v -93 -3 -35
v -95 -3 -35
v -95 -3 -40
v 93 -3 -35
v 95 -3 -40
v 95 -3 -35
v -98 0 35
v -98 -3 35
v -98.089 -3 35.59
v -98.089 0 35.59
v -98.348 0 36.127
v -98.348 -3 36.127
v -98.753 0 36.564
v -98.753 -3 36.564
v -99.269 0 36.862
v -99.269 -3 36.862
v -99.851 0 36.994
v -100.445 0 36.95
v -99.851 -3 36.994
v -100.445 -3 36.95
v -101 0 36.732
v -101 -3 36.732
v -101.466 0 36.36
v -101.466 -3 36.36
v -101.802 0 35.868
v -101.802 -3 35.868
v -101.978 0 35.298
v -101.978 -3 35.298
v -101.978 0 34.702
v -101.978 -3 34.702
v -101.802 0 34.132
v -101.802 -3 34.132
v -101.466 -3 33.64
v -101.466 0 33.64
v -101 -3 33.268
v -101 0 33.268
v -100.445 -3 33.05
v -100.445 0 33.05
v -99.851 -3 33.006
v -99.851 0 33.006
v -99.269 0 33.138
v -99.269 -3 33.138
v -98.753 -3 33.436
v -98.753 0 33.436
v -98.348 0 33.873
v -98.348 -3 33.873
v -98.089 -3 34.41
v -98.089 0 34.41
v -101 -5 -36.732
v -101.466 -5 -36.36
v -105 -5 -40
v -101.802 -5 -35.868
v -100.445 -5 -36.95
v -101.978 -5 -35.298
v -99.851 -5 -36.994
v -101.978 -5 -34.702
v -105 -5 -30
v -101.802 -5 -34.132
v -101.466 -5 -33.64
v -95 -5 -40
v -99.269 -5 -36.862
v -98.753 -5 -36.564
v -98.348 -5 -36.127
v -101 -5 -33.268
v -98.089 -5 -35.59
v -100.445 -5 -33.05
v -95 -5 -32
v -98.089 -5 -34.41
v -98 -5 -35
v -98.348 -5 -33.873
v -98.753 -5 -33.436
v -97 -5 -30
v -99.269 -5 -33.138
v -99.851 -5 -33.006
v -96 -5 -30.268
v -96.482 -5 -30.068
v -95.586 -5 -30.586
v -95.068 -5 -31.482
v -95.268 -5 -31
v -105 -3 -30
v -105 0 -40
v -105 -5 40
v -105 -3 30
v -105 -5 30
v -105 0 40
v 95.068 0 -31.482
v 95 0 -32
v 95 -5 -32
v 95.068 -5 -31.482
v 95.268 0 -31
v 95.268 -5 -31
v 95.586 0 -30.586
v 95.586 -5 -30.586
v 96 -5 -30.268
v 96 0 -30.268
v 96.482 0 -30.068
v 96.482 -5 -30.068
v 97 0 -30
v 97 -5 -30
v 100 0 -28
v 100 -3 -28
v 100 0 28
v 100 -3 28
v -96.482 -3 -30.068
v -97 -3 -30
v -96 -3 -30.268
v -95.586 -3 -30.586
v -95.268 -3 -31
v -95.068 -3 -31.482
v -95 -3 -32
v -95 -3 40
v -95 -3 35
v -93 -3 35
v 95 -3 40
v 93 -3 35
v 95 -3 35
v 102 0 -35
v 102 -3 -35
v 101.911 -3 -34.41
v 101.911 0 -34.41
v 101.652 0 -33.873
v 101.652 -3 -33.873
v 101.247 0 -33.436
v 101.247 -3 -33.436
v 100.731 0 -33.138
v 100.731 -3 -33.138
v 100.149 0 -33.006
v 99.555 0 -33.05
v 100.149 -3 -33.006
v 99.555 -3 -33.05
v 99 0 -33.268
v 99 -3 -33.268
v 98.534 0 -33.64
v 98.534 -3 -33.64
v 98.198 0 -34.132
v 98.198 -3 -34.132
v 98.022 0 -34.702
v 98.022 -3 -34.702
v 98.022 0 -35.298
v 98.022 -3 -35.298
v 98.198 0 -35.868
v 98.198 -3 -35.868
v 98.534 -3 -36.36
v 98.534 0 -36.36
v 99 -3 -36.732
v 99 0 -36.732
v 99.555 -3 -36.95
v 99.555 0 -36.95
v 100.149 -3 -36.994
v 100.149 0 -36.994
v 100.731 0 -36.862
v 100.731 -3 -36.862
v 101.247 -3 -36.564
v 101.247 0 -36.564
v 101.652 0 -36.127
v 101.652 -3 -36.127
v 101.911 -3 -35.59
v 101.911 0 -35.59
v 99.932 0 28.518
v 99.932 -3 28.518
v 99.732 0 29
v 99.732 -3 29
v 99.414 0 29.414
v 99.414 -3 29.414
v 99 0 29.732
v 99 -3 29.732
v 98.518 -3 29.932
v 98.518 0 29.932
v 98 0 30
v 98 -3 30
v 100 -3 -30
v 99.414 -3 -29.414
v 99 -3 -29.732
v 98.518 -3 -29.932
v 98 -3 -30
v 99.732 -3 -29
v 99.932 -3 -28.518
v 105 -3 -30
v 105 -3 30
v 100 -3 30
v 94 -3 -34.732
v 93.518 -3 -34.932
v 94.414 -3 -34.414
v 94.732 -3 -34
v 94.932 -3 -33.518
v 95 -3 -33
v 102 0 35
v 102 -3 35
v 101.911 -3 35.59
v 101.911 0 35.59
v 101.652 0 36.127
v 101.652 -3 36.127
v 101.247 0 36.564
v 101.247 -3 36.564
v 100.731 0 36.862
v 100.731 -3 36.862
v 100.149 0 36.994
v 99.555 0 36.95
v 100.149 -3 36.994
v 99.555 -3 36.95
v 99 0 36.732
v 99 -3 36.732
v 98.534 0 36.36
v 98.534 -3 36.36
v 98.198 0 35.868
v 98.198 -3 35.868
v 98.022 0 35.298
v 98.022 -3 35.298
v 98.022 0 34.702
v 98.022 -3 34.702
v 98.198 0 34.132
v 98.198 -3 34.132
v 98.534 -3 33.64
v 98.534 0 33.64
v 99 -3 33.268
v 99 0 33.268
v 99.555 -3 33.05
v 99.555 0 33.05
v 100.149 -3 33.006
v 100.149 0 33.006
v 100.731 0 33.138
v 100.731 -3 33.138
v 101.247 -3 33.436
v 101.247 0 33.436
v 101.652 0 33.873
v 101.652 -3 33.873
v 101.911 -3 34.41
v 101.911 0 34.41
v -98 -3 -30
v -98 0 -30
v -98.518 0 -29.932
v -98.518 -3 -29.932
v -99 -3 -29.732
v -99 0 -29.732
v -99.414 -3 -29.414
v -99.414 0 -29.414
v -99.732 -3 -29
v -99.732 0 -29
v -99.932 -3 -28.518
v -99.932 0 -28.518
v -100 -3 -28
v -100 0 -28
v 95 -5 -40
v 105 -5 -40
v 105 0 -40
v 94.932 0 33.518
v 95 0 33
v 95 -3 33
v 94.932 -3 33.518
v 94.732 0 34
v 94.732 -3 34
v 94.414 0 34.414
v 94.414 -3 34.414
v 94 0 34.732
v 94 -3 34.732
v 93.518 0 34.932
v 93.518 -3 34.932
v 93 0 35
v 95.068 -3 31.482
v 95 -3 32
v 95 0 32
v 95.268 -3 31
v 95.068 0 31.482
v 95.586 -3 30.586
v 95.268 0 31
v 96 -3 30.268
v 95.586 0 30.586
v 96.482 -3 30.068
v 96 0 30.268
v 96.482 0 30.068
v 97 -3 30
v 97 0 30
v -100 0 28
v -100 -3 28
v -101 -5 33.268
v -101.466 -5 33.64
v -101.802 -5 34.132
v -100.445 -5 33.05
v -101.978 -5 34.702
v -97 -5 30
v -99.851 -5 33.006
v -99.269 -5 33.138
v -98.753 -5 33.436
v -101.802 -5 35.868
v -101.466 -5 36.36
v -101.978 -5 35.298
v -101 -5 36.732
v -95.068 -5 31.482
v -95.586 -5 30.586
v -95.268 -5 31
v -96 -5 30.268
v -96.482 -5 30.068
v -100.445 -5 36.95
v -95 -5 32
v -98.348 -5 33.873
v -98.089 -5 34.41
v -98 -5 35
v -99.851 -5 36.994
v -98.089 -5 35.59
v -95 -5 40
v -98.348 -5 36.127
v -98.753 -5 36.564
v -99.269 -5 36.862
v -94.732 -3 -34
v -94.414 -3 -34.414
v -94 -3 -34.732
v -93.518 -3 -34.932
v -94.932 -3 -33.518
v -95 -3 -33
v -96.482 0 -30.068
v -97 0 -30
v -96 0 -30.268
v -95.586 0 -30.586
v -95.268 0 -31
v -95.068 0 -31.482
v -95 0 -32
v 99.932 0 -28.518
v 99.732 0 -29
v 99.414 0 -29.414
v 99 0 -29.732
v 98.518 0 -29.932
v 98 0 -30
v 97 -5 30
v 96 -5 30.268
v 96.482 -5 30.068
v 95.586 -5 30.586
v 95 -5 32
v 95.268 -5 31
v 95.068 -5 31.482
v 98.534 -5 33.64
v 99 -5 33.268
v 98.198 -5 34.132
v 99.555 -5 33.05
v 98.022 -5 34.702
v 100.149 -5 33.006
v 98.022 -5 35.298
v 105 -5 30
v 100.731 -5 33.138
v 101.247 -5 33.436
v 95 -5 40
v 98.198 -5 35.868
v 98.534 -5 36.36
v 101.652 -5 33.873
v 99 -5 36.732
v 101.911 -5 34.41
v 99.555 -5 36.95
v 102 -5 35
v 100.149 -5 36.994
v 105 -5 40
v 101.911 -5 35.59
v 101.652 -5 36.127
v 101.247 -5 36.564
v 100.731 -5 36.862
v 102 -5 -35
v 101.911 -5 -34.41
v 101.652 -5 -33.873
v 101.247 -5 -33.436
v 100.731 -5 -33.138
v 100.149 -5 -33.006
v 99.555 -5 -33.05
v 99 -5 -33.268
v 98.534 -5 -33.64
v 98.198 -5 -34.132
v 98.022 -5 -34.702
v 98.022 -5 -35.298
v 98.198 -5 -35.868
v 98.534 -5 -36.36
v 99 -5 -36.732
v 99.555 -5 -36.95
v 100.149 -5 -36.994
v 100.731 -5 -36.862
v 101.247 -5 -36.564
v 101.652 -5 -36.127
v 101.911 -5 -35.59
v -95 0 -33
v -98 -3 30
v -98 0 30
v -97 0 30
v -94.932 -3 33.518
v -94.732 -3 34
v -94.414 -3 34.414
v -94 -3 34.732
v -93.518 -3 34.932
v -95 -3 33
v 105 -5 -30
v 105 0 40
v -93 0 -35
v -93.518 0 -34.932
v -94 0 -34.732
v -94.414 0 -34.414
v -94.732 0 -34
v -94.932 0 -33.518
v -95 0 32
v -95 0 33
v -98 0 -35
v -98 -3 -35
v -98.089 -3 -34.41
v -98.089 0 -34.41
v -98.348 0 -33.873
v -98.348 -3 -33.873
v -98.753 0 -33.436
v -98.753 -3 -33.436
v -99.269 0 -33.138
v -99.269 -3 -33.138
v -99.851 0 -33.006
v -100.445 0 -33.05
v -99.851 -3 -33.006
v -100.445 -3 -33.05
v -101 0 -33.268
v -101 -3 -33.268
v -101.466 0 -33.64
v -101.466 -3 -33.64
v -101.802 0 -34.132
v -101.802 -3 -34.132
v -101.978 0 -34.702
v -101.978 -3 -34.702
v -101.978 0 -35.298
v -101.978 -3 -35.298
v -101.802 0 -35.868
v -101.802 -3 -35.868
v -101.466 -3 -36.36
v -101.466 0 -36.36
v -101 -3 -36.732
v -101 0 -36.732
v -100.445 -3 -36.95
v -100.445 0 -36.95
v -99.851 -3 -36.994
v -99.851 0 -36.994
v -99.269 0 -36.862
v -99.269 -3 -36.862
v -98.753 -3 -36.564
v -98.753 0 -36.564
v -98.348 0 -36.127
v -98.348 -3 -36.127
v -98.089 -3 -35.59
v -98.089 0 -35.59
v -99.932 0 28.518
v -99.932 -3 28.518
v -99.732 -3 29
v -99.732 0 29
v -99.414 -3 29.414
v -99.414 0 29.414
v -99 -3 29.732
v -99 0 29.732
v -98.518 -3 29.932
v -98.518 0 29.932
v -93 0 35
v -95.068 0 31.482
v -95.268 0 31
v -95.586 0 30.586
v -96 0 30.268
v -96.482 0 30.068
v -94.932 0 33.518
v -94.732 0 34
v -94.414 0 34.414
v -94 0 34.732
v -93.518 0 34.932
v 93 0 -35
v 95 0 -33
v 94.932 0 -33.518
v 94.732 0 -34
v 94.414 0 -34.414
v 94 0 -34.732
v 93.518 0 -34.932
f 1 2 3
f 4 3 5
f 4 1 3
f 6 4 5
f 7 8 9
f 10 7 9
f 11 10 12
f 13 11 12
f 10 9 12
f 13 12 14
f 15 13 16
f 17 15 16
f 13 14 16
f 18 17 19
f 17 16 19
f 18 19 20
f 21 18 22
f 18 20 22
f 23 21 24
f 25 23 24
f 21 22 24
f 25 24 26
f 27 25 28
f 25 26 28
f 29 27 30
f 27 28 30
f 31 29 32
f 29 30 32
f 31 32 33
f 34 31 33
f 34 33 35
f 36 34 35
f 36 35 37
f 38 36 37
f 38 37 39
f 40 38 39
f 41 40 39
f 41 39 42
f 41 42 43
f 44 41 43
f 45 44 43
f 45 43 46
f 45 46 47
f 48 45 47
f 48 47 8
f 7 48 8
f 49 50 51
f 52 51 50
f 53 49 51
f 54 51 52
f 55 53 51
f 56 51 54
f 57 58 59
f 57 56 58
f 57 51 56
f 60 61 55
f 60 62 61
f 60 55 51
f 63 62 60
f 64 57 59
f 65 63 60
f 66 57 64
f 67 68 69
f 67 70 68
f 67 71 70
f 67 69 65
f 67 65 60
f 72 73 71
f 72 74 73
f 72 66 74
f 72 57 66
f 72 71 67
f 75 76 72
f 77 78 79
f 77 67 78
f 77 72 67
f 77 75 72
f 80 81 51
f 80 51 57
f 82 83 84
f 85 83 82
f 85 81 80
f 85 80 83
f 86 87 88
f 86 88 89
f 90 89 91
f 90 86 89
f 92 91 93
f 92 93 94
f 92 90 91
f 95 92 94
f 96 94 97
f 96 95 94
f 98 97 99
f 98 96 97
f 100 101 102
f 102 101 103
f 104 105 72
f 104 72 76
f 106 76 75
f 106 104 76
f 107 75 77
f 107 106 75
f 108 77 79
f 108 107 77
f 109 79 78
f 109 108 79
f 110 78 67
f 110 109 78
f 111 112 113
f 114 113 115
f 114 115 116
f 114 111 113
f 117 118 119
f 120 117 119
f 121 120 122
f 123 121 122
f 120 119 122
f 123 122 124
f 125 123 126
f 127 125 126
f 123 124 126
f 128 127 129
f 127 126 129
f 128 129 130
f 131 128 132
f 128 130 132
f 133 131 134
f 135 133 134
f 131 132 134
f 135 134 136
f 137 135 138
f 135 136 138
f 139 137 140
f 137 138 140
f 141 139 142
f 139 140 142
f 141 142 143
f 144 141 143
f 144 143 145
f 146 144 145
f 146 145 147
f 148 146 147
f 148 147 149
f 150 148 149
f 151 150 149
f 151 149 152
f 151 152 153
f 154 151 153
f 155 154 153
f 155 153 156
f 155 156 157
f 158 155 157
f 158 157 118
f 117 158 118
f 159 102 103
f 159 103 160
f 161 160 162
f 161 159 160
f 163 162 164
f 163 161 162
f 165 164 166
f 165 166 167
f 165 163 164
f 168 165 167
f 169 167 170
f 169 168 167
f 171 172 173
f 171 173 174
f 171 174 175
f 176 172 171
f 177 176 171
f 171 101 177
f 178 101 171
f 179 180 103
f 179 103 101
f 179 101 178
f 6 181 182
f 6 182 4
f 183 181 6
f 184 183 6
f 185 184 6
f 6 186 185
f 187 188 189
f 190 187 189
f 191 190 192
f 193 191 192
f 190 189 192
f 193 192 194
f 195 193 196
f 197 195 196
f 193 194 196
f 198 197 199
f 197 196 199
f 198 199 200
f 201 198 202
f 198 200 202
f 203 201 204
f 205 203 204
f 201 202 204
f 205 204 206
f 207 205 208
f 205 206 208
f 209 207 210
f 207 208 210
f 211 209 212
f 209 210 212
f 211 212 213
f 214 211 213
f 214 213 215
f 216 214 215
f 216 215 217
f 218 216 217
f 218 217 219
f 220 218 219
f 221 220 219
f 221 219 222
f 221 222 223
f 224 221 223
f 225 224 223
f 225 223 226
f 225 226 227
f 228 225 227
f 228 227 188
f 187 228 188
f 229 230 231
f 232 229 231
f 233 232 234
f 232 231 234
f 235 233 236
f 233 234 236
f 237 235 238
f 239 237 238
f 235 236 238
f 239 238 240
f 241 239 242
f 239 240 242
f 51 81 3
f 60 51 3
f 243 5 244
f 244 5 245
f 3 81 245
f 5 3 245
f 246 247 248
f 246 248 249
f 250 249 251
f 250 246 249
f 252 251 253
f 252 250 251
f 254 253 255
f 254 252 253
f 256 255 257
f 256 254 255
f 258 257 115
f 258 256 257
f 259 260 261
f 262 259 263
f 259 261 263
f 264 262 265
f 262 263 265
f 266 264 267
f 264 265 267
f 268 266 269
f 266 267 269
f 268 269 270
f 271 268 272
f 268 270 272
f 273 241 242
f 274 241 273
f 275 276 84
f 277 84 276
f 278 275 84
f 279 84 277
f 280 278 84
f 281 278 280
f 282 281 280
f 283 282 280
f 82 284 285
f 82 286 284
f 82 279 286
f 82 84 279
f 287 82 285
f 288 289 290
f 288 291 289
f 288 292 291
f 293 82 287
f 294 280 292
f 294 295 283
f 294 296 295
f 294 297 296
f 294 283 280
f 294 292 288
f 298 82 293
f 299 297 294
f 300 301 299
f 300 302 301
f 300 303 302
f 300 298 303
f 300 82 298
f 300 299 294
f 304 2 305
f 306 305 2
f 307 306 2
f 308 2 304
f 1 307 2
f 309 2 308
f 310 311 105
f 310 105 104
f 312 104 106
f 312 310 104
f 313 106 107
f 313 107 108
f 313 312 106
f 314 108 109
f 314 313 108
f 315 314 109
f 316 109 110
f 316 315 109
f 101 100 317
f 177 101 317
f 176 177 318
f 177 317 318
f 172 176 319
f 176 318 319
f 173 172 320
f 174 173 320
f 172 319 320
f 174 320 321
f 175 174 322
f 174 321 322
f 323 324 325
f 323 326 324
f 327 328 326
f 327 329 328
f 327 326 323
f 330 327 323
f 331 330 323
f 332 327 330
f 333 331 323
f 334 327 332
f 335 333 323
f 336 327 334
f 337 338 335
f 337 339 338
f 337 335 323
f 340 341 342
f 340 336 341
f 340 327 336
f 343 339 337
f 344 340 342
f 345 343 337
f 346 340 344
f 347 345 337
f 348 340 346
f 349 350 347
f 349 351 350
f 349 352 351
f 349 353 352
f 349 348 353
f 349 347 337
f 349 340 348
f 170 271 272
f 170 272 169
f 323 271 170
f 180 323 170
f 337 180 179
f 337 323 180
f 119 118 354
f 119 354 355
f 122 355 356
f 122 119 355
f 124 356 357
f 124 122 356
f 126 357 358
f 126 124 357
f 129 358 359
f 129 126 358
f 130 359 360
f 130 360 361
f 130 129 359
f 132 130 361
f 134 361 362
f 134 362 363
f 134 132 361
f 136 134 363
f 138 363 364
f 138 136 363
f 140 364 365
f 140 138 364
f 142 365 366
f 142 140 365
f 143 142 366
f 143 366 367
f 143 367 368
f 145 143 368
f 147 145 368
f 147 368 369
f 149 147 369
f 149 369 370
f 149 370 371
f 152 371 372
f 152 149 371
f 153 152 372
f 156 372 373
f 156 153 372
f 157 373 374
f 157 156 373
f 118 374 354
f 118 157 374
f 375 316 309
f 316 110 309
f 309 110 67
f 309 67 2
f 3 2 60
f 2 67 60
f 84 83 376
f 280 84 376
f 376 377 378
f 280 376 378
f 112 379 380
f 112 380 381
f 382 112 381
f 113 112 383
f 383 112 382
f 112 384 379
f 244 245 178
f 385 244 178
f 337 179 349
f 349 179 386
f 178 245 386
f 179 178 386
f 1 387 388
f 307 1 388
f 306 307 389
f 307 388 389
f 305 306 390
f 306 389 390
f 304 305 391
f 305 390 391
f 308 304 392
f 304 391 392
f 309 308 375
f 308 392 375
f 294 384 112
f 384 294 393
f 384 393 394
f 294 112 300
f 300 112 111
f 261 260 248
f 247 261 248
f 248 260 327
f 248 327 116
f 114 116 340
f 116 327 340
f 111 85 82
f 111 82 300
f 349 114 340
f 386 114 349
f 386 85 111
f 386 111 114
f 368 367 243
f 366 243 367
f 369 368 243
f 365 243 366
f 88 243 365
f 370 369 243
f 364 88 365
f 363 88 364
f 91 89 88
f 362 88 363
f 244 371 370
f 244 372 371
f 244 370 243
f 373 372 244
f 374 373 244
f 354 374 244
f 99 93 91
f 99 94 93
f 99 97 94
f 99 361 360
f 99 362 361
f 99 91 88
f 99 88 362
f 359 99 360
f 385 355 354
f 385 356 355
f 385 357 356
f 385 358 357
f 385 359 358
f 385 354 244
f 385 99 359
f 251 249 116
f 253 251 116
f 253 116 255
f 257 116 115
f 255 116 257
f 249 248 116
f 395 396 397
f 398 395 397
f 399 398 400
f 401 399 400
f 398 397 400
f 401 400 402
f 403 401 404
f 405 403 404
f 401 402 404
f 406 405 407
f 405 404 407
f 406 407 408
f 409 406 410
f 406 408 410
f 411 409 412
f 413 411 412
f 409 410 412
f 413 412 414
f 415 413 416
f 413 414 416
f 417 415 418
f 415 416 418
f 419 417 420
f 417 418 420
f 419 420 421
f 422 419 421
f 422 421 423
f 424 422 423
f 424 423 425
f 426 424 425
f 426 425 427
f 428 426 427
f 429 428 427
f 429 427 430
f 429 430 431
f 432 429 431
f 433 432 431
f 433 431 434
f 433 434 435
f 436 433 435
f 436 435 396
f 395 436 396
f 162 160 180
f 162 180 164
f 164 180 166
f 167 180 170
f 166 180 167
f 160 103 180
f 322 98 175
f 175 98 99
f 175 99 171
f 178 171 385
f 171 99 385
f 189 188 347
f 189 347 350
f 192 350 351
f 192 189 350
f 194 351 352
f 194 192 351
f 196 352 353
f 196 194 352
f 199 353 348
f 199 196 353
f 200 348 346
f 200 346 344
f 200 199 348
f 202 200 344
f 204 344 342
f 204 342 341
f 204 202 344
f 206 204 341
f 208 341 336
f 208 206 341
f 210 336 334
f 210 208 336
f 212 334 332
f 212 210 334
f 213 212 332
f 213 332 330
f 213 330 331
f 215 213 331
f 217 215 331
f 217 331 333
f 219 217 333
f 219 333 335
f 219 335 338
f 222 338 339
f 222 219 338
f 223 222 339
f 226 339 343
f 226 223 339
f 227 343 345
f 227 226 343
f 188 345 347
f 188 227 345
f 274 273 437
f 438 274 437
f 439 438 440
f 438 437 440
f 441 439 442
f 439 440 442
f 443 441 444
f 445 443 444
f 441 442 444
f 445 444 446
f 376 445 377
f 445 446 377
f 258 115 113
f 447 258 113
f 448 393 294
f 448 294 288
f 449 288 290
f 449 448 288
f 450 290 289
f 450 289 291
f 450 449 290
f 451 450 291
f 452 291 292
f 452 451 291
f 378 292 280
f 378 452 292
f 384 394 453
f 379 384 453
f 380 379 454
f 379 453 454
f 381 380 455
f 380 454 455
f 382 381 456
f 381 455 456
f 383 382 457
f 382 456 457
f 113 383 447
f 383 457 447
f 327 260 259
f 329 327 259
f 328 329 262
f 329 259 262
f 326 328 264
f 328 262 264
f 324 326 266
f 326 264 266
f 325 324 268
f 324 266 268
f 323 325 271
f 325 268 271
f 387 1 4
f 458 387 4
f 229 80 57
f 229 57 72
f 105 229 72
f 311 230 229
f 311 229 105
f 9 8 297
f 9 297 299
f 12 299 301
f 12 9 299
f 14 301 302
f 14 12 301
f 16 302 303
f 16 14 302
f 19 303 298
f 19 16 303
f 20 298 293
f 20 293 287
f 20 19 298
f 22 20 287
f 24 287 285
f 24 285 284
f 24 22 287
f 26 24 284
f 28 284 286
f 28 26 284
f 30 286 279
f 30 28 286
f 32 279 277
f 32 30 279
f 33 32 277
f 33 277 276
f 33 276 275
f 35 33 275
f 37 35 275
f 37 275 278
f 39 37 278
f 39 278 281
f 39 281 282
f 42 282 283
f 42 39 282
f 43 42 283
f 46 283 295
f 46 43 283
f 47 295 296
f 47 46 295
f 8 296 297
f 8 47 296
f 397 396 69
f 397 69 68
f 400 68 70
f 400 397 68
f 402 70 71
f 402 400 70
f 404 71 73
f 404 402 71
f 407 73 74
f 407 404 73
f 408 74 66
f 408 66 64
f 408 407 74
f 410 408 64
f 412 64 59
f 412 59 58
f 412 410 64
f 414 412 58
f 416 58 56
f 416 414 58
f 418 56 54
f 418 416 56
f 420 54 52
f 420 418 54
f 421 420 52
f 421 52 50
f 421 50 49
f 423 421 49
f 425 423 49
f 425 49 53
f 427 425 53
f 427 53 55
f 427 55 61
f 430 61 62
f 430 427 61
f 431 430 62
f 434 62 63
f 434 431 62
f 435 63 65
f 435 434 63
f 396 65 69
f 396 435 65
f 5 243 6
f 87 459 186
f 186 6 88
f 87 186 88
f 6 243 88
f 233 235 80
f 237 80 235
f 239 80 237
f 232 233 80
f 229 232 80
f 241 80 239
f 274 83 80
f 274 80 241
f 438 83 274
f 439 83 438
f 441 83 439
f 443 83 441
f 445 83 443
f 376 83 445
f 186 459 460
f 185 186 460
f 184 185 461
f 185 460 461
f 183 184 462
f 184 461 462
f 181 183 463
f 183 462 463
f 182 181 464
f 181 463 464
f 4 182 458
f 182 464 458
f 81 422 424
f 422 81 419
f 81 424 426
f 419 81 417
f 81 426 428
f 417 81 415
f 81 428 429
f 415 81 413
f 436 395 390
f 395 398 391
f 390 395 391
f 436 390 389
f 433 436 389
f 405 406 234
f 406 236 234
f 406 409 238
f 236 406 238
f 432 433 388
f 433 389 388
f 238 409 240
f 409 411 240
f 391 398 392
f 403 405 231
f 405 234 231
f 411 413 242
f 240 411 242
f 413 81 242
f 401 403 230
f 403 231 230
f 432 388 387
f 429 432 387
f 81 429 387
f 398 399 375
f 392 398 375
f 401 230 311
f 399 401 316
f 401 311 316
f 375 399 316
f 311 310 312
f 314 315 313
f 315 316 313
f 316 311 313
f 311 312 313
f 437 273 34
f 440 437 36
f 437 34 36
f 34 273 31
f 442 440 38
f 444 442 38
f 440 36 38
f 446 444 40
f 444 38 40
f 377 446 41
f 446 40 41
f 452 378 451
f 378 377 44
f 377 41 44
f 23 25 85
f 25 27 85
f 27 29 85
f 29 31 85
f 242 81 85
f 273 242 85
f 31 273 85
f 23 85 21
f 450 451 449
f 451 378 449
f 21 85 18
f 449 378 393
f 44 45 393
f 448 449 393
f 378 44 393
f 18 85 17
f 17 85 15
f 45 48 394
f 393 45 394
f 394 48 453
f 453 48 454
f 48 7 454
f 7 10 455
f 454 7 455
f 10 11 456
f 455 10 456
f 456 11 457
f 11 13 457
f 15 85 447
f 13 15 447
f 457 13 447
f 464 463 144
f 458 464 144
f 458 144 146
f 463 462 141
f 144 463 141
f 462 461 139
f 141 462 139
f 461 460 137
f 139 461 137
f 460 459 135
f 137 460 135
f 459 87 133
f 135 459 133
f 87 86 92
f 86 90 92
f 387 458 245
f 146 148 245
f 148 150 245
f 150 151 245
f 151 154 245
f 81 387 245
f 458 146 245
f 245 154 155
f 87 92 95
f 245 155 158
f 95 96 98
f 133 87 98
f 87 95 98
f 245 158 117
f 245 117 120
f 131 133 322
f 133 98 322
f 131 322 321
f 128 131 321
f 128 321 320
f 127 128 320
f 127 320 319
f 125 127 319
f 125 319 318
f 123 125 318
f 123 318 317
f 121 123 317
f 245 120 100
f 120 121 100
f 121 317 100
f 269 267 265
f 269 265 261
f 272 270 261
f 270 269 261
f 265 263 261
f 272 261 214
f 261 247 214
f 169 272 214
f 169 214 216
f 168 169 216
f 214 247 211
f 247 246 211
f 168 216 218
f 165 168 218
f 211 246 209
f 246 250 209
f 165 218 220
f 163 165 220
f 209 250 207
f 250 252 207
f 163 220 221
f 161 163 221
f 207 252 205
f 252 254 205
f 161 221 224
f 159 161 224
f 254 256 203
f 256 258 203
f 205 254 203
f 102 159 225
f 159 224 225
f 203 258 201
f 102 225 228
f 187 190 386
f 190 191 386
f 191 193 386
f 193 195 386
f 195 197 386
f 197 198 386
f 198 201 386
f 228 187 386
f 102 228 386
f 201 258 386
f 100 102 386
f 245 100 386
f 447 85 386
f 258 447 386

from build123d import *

# Parameters (mm, degrees)
F0_W        = 210
F0_H        = 80
F1_DEPTH    = 3
F2_R        = 2
F3_DEPTH    = 25
F4_W        = 10
F4_H        = 10
F4_R        = 2
F5_DEPTH    = 2
F6_W        = 5
F6_H        = 60
F7_DEPTH    = 25
F8_T1_DEPTH = 3
F8_T3_DEPTH = 7
F8_T5_DEPTH = 8
F8_T7_DEPTH = 15


# Not quite as in the source:
# - a fillet or chamfer that OpenCascade refuses, or shapes differently, is made with other operations: its cross-section is extruded or revolved along the edge and cut away or added


with BuildPart() as f1:
    # F0 (on Front) → F1 (new body)
    with BuildSketch(Plane.XZ):
        Rectangle(F0_W, F0_H)
    extrude(amount=F1_DEPTH)

    # F2 (on face) → F3 (cut)
    with BuildSketch(Plane.XZ.offset(3)):
        with Locations((-100.000000149, 35.000000149)):
            Circle(F2_R)
        with Locations((-100.000000149, -35.000000149)):
            Circle(F2_R)
        with Locations((100.000000149, -35.000000149)):
            Circle(F2_R)
        with Locations((100.000000149, 35.000000149)):
            Circle(F2_R)
    extrude(amount=-F3_DEPTH, mode=Mode.SUBTRACT)

    # F4 (on face) → F5 (join)
    with BuildSketch(Plane.XZ.offset(3)):
        with Locations((-100, 35)):
            Rectangle(F4_W, F4_H)
        with Locations((-100.000000149, 35.000000149)):
            Circle(F4_R, mode=Mode.SUBTRACT)
        with Locations((-100, -35)):
            Rectangle(F4_W, F4_H)
        with Locations((-100.000000149, -35.000000149)):
            Circle(F4_R, mode=Mode.SUBTRACT)
        with Locations((100, -35)):
            Rectangle(F4_W, F4_H)
        with Locations((100.000000149, -35.000000149)):
            Circle(F4_R, mode=Mode.SUBTRACT)
        with Locations((100, 35)):
            Rectangle(F4_W, F4_H)
        with Locations((100.000000149, 35.000000149)):
            Circle(F4_R, mode=Mode.SUBTRACT)
    extrude(amount=F5_DEPTH)

    # F6 (on face) → F7 (cut)
    with BuildSketch(Plane.XZ.offset(3)):
        Polygon((95, 35), (-95, 35), (-95, 30), (-95, -30), (-95, -35), (95, -35), (95, -30), (95, 30), align=None)
        with Locations((-97.5, 0)):
            Rectangle(F6_W, F6_H)
        with Locations((97.5, 0)):
            Rectangle(F6_W, F6_H)
    extrude(amount=-F7_DEPTH, mode=Mode.SUBTRACT)

    # F8: fillet of radius 2 on 15 edges, made by hand

    # F8_s2 → F8_t1 (join)
    with BuildSketch(Plane.XZ):
        with BuildLine():
            ThreePointArc((-100, 28), (-99.4142135624, 29.4142135624), (-98, 30))
            Line((-98, 30), (-100, 30))
            Line((-100, 30), (-100, 28))
        make_face()
        with BuildLine():
            ThreePointArc((-95, 33), (-94.4142135624, 34.4142135624), (-93, 35))
            Line((-93, 35), (-95, 35))
            Line((-95, 35), (-95, 33))
        make_face()
        with BuildLine():
            ThreePointArc((-98, -30), (-99.4142135624, -29.4142135624), (-100, -28))
            Line((-100, -28), (-100, -30))
            Line((-100, -30), (-98, -30))
        make_face()
        with BuildLine():
            ThreePointArc((-93, -35), (-94.4142135624, -34.4142135624), (-95, -33))
            Line((-95, -33), (-95, -35))
            Line((-95, -35), (-93, -35))
        make_face()
        with BuildLine():
            ThreePointArc((95, 33), (94.4142135624, 34.4142135624), (93, 35))
            Line((93, 35), (95, 35))
            Line((95, 35), (95, 33))
        make_face()
        with BuildLine():
            ThreePointArc((100, 28), (99.4142135624, 29.4142135624), (98, 30))
            Line((98, 30), (100, 30))
            Line((100, 30), (100, 28))
        make_face()
        with BuildLine():
            ThreePointArc((95, -33), (94.4142135624, -34.4142135624), (93, -35))
            Line((93, -35), (95, -35))
            Line((95, -35), (95, -33))
        make_face()
        with BuildLine():
            ThreePointArc((100, -28), (99.4142135624, -29.4142135624), (98, -30))
            Line((98, -30), (100, -30))
            Line((100, -30), (100, -28))
        make_face()
    extrude(amount=F8_T1_DEPTH)

    # F8_s4 → F8_t3 (cut)
    with BuildSketch(Plane.XZ.offset(3)):
        with BuildLine():
            ThreePointArc((-95, 32), (-95.5857864376, 30.5857864376), (-97, 30))
            Line((-97, 30), (-95, 30))
            Line((-95, 30), (-95, 32))
        make_face()
        with BuildLine():
            ThreePointArc((-97, -30), (-95.5857864376, -30.5857864376), (-95, -32))
            Line((-95, -32), (-95, -30))
            Line((-95, -30), (-97, -30))
        make_face()
        with BuildLine():
            ThreePointArc((95, 32), (95.5857864376, 30.5857864376), (97, 30))
            Line((97, 30), (95, 30))
            Line((95, 30), (95, 32))
        make_face()
    extrude(amount=F8_T3_DEPTH, mode=Mode.SUBTRACT)

    # F8_s6 → F8_t5 (cut)
    with BuildSketch(Plane.XZ.offset(-5)):
        with BuildLine():
            ThreePointArc((-95, 32), (-95.5857864376, 30.5857864376), (-97, 30))
            Line((-97, 30), (-95, 30))
            Line((-95, 30), (-95, 32))
        make_face()
        with BuildLine():
            ThreePointArc((-97, -30), (-95.5857864376, -30.5857864376), (-95, -32))
            Line((-95, -32), (-95, -30))
            Line((-95, -30), (-97, -30))
        make_face()
        with BuildLine():
            ThreePointArc((95, 32), (95.5857864376, 30.5857864376), (97, 30))
            Line((97, 30), (95, 30))
            Line((95, 30), (95, 32))
        make_face()
    extrude(amount=F8_T5_DEPTH, mode=Mode.SUBTRACT)

    # F8_s8 → F8_t7 (cut)
    with BuildSketch(Plane.XZ.offset(-5)):
        with BuildLine():
            ThreePointArc((95, -32), (95.5857864376, -30.5857864376), (97, -30))
            Line((97, -30), (95, -30))
            Line((95, -30), (95, -32))
        make_face()
    extrude(amount=F8_T7_DEPTH, mode=Mode.SUBTRACT)


solid = f1.part
